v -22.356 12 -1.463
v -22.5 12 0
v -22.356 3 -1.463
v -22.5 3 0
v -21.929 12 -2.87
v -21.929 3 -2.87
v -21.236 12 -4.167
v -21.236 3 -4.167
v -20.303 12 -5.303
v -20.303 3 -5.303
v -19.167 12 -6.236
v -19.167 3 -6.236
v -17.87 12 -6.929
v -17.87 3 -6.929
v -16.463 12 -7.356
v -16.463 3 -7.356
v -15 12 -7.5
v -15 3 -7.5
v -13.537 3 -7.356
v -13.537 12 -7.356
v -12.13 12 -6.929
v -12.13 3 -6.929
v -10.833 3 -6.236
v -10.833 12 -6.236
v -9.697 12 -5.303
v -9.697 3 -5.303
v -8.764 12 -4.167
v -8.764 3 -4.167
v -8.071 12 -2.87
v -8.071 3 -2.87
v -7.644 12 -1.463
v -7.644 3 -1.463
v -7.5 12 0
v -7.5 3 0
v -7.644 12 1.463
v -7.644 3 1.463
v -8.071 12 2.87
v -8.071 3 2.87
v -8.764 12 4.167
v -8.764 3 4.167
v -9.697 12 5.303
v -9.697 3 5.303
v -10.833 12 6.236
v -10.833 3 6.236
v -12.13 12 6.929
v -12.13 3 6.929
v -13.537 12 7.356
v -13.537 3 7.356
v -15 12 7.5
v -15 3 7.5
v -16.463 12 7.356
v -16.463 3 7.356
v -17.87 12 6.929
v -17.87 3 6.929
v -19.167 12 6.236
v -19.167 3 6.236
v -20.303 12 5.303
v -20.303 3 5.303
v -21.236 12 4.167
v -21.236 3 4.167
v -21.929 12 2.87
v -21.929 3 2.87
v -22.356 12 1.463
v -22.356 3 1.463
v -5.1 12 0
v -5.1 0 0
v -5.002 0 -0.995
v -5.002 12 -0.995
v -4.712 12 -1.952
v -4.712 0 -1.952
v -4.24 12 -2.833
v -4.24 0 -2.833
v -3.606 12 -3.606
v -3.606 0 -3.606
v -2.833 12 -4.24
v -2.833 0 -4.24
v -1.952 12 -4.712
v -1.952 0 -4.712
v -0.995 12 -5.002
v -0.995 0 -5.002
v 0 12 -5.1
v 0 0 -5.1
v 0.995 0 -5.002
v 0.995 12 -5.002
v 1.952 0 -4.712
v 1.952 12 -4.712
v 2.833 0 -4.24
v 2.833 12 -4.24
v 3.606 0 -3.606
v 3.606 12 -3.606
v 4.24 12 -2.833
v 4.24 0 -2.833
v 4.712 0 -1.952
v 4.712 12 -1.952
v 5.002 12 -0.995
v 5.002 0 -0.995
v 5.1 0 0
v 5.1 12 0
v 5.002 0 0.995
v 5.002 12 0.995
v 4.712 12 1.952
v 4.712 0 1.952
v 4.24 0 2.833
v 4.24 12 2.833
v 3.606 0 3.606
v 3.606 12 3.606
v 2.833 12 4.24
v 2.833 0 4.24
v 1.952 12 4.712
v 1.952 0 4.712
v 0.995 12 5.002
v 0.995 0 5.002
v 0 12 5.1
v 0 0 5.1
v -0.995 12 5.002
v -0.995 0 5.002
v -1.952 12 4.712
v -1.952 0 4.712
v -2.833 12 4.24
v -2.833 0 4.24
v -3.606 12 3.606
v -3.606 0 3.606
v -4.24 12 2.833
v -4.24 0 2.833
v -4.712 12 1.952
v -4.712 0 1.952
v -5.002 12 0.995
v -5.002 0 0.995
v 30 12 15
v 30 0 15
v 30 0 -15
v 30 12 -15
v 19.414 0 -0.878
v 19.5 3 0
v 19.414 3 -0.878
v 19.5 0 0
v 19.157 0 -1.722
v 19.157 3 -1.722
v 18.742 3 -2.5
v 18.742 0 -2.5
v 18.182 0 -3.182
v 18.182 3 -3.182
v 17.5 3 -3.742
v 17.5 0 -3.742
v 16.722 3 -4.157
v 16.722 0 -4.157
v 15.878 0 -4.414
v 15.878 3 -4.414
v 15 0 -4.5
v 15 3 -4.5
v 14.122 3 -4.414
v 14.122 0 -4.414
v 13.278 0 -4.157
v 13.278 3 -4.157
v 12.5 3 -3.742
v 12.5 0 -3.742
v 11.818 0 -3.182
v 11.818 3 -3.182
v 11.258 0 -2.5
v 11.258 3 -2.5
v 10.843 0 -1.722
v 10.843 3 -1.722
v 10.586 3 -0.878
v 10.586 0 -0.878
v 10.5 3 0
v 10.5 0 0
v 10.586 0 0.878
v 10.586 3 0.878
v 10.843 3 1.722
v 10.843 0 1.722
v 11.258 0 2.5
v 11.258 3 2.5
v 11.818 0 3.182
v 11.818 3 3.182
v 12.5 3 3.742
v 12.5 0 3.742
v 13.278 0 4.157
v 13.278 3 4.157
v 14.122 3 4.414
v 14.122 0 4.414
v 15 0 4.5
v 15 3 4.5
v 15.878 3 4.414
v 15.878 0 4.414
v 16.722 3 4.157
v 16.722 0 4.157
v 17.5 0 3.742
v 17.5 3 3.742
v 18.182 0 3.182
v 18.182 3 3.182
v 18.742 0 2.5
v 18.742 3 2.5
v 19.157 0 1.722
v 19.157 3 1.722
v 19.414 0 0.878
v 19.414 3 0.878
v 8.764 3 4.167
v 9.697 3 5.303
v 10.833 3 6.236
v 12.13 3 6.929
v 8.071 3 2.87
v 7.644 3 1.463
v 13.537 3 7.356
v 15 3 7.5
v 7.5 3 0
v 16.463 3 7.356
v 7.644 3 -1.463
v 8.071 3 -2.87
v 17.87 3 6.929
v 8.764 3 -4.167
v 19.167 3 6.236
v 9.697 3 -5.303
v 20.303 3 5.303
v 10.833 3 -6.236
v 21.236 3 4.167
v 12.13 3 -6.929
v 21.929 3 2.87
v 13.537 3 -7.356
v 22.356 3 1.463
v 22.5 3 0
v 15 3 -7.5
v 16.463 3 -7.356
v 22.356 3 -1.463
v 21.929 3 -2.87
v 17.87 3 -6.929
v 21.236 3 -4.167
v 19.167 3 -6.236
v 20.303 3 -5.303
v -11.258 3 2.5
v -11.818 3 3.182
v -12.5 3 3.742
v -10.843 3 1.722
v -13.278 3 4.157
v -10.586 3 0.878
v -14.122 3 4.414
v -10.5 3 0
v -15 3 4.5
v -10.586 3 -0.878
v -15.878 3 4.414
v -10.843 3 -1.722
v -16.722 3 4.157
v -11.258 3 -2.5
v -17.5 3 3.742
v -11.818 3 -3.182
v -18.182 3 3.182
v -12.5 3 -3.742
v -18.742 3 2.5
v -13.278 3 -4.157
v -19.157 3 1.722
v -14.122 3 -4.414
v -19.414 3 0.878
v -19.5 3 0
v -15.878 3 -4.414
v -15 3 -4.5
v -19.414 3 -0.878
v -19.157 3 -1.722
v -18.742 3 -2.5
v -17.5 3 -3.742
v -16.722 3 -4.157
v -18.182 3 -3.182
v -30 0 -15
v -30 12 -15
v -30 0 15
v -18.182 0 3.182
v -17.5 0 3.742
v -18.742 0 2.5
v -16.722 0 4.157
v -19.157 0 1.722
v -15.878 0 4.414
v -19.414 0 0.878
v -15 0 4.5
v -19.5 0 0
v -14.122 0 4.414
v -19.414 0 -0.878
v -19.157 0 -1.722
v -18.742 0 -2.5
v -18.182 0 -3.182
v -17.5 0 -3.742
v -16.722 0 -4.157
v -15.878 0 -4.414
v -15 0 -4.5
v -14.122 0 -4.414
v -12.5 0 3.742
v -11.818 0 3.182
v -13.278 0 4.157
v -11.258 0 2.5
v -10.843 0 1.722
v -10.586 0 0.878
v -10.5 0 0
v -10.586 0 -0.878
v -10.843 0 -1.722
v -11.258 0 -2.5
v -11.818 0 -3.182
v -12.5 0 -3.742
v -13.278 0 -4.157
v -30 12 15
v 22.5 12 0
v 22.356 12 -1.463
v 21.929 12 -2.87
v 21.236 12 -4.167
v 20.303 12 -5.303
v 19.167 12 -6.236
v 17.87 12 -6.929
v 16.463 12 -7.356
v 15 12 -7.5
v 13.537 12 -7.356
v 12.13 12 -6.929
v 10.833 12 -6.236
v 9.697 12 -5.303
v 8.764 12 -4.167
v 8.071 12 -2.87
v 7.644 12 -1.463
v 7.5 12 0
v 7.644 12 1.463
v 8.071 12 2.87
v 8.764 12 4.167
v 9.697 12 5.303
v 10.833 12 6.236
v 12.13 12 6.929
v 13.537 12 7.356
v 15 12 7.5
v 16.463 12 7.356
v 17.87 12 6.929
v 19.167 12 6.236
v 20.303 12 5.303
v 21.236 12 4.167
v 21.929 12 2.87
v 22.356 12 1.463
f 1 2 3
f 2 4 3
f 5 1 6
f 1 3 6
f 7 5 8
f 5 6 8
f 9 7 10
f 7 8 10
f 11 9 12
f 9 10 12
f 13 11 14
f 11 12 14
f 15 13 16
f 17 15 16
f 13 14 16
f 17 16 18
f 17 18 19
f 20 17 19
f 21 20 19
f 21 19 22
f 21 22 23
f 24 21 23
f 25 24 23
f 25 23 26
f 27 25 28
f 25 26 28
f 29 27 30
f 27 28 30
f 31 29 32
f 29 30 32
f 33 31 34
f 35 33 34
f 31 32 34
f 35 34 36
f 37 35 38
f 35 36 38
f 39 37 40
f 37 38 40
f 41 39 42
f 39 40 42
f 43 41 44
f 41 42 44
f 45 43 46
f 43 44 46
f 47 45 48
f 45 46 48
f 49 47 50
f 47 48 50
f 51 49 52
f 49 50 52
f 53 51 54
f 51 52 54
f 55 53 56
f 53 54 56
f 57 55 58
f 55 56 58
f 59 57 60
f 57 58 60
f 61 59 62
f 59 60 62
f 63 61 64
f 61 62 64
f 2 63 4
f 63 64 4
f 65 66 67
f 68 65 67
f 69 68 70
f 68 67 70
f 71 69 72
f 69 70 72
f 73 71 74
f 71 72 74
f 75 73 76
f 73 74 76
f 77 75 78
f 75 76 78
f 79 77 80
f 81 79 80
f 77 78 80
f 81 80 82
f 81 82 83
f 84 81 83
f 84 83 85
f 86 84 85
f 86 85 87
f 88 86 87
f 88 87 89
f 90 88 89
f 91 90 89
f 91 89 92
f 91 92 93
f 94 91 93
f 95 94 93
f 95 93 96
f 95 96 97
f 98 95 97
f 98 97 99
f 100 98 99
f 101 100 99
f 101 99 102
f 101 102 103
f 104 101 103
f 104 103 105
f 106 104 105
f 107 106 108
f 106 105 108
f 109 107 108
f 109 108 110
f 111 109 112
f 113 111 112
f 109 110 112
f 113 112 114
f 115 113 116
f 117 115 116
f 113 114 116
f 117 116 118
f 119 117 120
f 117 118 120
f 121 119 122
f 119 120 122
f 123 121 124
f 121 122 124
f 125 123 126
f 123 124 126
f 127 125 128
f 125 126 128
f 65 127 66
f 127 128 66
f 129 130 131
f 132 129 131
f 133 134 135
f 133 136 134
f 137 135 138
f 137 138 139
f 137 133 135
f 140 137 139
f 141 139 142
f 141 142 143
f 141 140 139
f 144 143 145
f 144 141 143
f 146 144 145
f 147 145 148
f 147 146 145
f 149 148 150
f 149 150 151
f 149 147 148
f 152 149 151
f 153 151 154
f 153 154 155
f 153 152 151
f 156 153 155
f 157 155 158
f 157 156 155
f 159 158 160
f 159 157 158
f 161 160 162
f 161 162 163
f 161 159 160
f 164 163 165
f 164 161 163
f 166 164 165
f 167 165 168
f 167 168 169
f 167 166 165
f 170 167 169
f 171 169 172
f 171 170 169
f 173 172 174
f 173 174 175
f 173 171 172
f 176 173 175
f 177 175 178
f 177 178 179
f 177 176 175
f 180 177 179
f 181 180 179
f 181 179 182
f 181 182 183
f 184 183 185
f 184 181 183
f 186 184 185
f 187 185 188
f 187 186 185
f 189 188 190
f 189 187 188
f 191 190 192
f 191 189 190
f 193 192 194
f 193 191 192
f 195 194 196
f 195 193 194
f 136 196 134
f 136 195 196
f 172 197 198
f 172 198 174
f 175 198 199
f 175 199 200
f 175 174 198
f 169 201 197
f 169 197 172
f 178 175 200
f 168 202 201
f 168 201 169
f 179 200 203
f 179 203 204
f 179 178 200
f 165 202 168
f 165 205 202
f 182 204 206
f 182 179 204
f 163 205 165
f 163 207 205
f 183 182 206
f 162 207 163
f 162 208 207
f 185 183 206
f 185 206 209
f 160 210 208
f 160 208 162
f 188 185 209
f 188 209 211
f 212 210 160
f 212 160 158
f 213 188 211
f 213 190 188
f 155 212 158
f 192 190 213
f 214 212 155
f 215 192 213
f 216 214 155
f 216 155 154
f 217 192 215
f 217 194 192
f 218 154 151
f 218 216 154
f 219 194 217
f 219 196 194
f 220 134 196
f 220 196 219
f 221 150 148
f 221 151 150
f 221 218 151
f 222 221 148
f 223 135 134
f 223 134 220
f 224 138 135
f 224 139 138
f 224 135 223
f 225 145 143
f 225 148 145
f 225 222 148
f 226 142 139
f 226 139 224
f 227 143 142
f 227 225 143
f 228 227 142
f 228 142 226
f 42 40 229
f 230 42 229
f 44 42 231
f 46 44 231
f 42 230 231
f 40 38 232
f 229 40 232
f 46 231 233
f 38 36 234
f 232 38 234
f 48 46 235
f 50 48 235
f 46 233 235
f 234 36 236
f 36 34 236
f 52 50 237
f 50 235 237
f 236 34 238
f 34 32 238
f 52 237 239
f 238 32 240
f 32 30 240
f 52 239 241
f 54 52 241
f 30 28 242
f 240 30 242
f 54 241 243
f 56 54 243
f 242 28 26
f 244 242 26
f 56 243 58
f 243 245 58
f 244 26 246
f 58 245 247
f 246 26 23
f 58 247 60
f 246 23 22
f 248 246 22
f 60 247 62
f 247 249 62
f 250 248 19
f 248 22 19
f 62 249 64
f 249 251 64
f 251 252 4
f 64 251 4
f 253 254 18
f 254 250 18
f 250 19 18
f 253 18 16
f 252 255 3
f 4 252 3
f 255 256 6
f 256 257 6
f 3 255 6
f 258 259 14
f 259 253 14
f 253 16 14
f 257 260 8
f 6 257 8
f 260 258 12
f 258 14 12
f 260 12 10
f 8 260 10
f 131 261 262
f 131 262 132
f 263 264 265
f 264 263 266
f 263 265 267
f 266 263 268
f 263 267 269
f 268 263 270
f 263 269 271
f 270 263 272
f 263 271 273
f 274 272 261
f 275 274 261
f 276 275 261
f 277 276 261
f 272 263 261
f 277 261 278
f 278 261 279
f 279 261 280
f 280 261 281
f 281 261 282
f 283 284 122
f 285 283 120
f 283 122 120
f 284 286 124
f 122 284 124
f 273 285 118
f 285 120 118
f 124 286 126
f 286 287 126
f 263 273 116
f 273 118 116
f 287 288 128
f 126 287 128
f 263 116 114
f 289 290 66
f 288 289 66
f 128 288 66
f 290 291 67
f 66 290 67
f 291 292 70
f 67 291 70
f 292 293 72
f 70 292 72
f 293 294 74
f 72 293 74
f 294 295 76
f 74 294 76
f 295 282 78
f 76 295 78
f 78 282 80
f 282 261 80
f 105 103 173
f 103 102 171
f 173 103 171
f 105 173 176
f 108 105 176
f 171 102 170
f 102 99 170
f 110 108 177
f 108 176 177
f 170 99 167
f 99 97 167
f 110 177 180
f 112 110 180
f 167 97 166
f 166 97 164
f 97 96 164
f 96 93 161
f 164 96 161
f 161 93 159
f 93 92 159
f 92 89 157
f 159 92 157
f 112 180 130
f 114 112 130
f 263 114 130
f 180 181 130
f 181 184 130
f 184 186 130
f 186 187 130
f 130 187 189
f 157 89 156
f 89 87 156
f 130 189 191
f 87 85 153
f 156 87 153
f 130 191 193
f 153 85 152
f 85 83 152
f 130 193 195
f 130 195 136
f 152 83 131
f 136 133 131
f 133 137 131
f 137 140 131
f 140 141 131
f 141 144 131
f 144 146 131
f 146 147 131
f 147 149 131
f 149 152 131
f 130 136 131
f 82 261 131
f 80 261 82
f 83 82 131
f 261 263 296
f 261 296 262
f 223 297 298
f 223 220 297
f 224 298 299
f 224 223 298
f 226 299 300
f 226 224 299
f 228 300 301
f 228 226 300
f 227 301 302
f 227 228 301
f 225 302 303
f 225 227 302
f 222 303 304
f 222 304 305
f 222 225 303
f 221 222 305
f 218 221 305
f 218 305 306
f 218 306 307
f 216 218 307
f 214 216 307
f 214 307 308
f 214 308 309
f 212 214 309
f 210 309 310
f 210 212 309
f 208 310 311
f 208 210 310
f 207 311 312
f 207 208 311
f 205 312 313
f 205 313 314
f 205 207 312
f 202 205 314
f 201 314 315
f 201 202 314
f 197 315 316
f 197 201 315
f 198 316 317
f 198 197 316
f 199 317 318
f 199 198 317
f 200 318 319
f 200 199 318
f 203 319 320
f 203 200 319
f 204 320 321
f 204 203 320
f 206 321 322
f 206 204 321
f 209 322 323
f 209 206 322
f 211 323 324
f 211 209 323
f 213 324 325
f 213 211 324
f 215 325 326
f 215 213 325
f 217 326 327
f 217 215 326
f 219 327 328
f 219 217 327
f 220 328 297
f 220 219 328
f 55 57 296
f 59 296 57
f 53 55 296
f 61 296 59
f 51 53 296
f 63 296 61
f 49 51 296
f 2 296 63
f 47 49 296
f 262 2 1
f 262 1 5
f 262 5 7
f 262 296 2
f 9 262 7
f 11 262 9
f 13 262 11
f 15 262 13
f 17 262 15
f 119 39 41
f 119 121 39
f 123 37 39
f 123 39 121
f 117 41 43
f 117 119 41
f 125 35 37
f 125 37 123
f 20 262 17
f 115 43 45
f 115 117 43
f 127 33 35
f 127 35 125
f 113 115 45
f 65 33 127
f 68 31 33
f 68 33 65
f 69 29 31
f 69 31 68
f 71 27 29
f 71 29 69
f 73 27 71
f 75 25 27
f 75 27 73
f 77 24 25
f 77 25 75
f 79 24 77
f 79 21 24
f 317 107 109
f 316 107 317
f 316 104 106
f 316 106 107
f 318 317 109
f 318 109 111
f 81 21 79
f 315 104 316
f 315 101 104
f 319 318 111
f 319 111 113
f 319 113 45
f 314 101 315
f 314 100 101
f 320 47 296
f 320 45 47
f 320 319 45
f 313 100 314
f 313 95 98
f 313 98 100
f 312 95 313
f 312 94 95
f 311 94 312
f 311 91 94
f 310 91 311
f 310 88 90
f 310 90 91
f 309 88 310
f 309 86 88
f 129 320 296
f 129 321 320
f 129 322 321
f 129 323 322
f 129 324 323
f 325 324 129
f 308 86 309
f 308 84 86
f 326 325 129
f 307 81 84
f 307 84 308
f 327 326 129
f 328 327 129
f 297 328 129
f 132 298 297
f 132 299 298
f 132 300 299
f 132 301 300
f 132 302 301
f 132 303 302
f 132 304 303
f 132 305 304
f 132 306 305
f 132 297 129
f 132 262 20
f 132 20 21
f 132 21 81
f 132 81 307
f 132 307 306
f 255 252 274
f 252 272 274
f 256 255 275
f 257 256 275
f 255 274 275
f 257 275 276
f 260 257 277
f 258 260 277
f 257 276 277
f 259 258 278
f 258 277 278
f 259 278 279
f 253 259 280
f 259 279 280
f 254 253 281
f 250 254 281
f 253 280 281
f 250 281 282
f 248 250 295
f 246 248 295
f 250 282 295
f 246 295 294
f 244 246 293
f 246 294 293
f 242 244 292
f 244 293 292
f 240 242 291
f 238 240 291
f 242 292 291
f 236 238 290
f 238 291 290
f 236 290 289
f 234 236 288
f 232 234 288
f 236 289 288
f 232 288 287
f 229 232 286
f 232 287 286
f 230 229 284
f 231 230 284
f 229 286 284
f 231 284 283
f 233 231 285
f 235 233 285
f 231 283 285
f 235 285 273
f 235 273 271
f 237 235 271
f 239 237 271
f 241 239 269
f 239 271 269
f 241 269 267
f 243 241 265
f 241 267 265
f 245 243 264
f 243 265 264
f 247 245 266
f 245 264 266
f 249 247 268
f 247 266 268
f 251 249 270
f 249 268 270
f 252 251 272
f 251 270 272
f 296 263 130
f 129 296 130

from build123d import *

# Parameters (mm, degrees)
SKETCH_1_W             = 60
SKETCH_1_H             = 30
EXTRUDE_1_DEPTH        = 12
HOLE_WIZARD_M121_D     = 10.2
HOLE_WIZARD_M121_DEPTH = 12


with BuildPart() as part:
    # Эскиз1 → Бобышка-Вытянуть1 (new body)
    with BuildSketch(Plane(origin=(0, 0, 0), x_dir=(1, 0, 0), z_dir=(0, 1, 0))):
        Rectangle(SKETCH_1_W, SKETCH_1_H)
    extrude(amount=EXTRUDE_1_DEPTH)

    # Эскиз2 → Вырез-Повернуть1 (revolve, cut)
    with BuildSketch(Plane.XY):
        Polygon((-22.5, 12), (-22.5, 3), (-19.5, 3), (-19.5, 0), (-15, 0), (-15, 12), align=None)
    cut_revolve_1 = revolve(axis=Axis((-15, 12, 0), (0, -1, 0)), mode=Mode.SUBTRACT)

    # Зеркальное отражение1: Вырез-Повернуть1 across plane
    add(cut_revolve_1.mirror(Plane(origin=(0, 0, 0), x_dir=(0, 0, 1), z_dir=(1, 0, 0))), mode=Mode.SUBTRACT)

    # Отверстие обработанное метчиком M121
    with Locations(Plane(origin=(0, 12, 0), x_dir=(1, 0, 0), z_dir=(0, 1, 0))):
        with Locations((0, 0)):
            Hole(HOLE_WIZARD_M121_D / 2, depth=HOLE_WIZARD_M121_DEPTH)


solid = part.part
